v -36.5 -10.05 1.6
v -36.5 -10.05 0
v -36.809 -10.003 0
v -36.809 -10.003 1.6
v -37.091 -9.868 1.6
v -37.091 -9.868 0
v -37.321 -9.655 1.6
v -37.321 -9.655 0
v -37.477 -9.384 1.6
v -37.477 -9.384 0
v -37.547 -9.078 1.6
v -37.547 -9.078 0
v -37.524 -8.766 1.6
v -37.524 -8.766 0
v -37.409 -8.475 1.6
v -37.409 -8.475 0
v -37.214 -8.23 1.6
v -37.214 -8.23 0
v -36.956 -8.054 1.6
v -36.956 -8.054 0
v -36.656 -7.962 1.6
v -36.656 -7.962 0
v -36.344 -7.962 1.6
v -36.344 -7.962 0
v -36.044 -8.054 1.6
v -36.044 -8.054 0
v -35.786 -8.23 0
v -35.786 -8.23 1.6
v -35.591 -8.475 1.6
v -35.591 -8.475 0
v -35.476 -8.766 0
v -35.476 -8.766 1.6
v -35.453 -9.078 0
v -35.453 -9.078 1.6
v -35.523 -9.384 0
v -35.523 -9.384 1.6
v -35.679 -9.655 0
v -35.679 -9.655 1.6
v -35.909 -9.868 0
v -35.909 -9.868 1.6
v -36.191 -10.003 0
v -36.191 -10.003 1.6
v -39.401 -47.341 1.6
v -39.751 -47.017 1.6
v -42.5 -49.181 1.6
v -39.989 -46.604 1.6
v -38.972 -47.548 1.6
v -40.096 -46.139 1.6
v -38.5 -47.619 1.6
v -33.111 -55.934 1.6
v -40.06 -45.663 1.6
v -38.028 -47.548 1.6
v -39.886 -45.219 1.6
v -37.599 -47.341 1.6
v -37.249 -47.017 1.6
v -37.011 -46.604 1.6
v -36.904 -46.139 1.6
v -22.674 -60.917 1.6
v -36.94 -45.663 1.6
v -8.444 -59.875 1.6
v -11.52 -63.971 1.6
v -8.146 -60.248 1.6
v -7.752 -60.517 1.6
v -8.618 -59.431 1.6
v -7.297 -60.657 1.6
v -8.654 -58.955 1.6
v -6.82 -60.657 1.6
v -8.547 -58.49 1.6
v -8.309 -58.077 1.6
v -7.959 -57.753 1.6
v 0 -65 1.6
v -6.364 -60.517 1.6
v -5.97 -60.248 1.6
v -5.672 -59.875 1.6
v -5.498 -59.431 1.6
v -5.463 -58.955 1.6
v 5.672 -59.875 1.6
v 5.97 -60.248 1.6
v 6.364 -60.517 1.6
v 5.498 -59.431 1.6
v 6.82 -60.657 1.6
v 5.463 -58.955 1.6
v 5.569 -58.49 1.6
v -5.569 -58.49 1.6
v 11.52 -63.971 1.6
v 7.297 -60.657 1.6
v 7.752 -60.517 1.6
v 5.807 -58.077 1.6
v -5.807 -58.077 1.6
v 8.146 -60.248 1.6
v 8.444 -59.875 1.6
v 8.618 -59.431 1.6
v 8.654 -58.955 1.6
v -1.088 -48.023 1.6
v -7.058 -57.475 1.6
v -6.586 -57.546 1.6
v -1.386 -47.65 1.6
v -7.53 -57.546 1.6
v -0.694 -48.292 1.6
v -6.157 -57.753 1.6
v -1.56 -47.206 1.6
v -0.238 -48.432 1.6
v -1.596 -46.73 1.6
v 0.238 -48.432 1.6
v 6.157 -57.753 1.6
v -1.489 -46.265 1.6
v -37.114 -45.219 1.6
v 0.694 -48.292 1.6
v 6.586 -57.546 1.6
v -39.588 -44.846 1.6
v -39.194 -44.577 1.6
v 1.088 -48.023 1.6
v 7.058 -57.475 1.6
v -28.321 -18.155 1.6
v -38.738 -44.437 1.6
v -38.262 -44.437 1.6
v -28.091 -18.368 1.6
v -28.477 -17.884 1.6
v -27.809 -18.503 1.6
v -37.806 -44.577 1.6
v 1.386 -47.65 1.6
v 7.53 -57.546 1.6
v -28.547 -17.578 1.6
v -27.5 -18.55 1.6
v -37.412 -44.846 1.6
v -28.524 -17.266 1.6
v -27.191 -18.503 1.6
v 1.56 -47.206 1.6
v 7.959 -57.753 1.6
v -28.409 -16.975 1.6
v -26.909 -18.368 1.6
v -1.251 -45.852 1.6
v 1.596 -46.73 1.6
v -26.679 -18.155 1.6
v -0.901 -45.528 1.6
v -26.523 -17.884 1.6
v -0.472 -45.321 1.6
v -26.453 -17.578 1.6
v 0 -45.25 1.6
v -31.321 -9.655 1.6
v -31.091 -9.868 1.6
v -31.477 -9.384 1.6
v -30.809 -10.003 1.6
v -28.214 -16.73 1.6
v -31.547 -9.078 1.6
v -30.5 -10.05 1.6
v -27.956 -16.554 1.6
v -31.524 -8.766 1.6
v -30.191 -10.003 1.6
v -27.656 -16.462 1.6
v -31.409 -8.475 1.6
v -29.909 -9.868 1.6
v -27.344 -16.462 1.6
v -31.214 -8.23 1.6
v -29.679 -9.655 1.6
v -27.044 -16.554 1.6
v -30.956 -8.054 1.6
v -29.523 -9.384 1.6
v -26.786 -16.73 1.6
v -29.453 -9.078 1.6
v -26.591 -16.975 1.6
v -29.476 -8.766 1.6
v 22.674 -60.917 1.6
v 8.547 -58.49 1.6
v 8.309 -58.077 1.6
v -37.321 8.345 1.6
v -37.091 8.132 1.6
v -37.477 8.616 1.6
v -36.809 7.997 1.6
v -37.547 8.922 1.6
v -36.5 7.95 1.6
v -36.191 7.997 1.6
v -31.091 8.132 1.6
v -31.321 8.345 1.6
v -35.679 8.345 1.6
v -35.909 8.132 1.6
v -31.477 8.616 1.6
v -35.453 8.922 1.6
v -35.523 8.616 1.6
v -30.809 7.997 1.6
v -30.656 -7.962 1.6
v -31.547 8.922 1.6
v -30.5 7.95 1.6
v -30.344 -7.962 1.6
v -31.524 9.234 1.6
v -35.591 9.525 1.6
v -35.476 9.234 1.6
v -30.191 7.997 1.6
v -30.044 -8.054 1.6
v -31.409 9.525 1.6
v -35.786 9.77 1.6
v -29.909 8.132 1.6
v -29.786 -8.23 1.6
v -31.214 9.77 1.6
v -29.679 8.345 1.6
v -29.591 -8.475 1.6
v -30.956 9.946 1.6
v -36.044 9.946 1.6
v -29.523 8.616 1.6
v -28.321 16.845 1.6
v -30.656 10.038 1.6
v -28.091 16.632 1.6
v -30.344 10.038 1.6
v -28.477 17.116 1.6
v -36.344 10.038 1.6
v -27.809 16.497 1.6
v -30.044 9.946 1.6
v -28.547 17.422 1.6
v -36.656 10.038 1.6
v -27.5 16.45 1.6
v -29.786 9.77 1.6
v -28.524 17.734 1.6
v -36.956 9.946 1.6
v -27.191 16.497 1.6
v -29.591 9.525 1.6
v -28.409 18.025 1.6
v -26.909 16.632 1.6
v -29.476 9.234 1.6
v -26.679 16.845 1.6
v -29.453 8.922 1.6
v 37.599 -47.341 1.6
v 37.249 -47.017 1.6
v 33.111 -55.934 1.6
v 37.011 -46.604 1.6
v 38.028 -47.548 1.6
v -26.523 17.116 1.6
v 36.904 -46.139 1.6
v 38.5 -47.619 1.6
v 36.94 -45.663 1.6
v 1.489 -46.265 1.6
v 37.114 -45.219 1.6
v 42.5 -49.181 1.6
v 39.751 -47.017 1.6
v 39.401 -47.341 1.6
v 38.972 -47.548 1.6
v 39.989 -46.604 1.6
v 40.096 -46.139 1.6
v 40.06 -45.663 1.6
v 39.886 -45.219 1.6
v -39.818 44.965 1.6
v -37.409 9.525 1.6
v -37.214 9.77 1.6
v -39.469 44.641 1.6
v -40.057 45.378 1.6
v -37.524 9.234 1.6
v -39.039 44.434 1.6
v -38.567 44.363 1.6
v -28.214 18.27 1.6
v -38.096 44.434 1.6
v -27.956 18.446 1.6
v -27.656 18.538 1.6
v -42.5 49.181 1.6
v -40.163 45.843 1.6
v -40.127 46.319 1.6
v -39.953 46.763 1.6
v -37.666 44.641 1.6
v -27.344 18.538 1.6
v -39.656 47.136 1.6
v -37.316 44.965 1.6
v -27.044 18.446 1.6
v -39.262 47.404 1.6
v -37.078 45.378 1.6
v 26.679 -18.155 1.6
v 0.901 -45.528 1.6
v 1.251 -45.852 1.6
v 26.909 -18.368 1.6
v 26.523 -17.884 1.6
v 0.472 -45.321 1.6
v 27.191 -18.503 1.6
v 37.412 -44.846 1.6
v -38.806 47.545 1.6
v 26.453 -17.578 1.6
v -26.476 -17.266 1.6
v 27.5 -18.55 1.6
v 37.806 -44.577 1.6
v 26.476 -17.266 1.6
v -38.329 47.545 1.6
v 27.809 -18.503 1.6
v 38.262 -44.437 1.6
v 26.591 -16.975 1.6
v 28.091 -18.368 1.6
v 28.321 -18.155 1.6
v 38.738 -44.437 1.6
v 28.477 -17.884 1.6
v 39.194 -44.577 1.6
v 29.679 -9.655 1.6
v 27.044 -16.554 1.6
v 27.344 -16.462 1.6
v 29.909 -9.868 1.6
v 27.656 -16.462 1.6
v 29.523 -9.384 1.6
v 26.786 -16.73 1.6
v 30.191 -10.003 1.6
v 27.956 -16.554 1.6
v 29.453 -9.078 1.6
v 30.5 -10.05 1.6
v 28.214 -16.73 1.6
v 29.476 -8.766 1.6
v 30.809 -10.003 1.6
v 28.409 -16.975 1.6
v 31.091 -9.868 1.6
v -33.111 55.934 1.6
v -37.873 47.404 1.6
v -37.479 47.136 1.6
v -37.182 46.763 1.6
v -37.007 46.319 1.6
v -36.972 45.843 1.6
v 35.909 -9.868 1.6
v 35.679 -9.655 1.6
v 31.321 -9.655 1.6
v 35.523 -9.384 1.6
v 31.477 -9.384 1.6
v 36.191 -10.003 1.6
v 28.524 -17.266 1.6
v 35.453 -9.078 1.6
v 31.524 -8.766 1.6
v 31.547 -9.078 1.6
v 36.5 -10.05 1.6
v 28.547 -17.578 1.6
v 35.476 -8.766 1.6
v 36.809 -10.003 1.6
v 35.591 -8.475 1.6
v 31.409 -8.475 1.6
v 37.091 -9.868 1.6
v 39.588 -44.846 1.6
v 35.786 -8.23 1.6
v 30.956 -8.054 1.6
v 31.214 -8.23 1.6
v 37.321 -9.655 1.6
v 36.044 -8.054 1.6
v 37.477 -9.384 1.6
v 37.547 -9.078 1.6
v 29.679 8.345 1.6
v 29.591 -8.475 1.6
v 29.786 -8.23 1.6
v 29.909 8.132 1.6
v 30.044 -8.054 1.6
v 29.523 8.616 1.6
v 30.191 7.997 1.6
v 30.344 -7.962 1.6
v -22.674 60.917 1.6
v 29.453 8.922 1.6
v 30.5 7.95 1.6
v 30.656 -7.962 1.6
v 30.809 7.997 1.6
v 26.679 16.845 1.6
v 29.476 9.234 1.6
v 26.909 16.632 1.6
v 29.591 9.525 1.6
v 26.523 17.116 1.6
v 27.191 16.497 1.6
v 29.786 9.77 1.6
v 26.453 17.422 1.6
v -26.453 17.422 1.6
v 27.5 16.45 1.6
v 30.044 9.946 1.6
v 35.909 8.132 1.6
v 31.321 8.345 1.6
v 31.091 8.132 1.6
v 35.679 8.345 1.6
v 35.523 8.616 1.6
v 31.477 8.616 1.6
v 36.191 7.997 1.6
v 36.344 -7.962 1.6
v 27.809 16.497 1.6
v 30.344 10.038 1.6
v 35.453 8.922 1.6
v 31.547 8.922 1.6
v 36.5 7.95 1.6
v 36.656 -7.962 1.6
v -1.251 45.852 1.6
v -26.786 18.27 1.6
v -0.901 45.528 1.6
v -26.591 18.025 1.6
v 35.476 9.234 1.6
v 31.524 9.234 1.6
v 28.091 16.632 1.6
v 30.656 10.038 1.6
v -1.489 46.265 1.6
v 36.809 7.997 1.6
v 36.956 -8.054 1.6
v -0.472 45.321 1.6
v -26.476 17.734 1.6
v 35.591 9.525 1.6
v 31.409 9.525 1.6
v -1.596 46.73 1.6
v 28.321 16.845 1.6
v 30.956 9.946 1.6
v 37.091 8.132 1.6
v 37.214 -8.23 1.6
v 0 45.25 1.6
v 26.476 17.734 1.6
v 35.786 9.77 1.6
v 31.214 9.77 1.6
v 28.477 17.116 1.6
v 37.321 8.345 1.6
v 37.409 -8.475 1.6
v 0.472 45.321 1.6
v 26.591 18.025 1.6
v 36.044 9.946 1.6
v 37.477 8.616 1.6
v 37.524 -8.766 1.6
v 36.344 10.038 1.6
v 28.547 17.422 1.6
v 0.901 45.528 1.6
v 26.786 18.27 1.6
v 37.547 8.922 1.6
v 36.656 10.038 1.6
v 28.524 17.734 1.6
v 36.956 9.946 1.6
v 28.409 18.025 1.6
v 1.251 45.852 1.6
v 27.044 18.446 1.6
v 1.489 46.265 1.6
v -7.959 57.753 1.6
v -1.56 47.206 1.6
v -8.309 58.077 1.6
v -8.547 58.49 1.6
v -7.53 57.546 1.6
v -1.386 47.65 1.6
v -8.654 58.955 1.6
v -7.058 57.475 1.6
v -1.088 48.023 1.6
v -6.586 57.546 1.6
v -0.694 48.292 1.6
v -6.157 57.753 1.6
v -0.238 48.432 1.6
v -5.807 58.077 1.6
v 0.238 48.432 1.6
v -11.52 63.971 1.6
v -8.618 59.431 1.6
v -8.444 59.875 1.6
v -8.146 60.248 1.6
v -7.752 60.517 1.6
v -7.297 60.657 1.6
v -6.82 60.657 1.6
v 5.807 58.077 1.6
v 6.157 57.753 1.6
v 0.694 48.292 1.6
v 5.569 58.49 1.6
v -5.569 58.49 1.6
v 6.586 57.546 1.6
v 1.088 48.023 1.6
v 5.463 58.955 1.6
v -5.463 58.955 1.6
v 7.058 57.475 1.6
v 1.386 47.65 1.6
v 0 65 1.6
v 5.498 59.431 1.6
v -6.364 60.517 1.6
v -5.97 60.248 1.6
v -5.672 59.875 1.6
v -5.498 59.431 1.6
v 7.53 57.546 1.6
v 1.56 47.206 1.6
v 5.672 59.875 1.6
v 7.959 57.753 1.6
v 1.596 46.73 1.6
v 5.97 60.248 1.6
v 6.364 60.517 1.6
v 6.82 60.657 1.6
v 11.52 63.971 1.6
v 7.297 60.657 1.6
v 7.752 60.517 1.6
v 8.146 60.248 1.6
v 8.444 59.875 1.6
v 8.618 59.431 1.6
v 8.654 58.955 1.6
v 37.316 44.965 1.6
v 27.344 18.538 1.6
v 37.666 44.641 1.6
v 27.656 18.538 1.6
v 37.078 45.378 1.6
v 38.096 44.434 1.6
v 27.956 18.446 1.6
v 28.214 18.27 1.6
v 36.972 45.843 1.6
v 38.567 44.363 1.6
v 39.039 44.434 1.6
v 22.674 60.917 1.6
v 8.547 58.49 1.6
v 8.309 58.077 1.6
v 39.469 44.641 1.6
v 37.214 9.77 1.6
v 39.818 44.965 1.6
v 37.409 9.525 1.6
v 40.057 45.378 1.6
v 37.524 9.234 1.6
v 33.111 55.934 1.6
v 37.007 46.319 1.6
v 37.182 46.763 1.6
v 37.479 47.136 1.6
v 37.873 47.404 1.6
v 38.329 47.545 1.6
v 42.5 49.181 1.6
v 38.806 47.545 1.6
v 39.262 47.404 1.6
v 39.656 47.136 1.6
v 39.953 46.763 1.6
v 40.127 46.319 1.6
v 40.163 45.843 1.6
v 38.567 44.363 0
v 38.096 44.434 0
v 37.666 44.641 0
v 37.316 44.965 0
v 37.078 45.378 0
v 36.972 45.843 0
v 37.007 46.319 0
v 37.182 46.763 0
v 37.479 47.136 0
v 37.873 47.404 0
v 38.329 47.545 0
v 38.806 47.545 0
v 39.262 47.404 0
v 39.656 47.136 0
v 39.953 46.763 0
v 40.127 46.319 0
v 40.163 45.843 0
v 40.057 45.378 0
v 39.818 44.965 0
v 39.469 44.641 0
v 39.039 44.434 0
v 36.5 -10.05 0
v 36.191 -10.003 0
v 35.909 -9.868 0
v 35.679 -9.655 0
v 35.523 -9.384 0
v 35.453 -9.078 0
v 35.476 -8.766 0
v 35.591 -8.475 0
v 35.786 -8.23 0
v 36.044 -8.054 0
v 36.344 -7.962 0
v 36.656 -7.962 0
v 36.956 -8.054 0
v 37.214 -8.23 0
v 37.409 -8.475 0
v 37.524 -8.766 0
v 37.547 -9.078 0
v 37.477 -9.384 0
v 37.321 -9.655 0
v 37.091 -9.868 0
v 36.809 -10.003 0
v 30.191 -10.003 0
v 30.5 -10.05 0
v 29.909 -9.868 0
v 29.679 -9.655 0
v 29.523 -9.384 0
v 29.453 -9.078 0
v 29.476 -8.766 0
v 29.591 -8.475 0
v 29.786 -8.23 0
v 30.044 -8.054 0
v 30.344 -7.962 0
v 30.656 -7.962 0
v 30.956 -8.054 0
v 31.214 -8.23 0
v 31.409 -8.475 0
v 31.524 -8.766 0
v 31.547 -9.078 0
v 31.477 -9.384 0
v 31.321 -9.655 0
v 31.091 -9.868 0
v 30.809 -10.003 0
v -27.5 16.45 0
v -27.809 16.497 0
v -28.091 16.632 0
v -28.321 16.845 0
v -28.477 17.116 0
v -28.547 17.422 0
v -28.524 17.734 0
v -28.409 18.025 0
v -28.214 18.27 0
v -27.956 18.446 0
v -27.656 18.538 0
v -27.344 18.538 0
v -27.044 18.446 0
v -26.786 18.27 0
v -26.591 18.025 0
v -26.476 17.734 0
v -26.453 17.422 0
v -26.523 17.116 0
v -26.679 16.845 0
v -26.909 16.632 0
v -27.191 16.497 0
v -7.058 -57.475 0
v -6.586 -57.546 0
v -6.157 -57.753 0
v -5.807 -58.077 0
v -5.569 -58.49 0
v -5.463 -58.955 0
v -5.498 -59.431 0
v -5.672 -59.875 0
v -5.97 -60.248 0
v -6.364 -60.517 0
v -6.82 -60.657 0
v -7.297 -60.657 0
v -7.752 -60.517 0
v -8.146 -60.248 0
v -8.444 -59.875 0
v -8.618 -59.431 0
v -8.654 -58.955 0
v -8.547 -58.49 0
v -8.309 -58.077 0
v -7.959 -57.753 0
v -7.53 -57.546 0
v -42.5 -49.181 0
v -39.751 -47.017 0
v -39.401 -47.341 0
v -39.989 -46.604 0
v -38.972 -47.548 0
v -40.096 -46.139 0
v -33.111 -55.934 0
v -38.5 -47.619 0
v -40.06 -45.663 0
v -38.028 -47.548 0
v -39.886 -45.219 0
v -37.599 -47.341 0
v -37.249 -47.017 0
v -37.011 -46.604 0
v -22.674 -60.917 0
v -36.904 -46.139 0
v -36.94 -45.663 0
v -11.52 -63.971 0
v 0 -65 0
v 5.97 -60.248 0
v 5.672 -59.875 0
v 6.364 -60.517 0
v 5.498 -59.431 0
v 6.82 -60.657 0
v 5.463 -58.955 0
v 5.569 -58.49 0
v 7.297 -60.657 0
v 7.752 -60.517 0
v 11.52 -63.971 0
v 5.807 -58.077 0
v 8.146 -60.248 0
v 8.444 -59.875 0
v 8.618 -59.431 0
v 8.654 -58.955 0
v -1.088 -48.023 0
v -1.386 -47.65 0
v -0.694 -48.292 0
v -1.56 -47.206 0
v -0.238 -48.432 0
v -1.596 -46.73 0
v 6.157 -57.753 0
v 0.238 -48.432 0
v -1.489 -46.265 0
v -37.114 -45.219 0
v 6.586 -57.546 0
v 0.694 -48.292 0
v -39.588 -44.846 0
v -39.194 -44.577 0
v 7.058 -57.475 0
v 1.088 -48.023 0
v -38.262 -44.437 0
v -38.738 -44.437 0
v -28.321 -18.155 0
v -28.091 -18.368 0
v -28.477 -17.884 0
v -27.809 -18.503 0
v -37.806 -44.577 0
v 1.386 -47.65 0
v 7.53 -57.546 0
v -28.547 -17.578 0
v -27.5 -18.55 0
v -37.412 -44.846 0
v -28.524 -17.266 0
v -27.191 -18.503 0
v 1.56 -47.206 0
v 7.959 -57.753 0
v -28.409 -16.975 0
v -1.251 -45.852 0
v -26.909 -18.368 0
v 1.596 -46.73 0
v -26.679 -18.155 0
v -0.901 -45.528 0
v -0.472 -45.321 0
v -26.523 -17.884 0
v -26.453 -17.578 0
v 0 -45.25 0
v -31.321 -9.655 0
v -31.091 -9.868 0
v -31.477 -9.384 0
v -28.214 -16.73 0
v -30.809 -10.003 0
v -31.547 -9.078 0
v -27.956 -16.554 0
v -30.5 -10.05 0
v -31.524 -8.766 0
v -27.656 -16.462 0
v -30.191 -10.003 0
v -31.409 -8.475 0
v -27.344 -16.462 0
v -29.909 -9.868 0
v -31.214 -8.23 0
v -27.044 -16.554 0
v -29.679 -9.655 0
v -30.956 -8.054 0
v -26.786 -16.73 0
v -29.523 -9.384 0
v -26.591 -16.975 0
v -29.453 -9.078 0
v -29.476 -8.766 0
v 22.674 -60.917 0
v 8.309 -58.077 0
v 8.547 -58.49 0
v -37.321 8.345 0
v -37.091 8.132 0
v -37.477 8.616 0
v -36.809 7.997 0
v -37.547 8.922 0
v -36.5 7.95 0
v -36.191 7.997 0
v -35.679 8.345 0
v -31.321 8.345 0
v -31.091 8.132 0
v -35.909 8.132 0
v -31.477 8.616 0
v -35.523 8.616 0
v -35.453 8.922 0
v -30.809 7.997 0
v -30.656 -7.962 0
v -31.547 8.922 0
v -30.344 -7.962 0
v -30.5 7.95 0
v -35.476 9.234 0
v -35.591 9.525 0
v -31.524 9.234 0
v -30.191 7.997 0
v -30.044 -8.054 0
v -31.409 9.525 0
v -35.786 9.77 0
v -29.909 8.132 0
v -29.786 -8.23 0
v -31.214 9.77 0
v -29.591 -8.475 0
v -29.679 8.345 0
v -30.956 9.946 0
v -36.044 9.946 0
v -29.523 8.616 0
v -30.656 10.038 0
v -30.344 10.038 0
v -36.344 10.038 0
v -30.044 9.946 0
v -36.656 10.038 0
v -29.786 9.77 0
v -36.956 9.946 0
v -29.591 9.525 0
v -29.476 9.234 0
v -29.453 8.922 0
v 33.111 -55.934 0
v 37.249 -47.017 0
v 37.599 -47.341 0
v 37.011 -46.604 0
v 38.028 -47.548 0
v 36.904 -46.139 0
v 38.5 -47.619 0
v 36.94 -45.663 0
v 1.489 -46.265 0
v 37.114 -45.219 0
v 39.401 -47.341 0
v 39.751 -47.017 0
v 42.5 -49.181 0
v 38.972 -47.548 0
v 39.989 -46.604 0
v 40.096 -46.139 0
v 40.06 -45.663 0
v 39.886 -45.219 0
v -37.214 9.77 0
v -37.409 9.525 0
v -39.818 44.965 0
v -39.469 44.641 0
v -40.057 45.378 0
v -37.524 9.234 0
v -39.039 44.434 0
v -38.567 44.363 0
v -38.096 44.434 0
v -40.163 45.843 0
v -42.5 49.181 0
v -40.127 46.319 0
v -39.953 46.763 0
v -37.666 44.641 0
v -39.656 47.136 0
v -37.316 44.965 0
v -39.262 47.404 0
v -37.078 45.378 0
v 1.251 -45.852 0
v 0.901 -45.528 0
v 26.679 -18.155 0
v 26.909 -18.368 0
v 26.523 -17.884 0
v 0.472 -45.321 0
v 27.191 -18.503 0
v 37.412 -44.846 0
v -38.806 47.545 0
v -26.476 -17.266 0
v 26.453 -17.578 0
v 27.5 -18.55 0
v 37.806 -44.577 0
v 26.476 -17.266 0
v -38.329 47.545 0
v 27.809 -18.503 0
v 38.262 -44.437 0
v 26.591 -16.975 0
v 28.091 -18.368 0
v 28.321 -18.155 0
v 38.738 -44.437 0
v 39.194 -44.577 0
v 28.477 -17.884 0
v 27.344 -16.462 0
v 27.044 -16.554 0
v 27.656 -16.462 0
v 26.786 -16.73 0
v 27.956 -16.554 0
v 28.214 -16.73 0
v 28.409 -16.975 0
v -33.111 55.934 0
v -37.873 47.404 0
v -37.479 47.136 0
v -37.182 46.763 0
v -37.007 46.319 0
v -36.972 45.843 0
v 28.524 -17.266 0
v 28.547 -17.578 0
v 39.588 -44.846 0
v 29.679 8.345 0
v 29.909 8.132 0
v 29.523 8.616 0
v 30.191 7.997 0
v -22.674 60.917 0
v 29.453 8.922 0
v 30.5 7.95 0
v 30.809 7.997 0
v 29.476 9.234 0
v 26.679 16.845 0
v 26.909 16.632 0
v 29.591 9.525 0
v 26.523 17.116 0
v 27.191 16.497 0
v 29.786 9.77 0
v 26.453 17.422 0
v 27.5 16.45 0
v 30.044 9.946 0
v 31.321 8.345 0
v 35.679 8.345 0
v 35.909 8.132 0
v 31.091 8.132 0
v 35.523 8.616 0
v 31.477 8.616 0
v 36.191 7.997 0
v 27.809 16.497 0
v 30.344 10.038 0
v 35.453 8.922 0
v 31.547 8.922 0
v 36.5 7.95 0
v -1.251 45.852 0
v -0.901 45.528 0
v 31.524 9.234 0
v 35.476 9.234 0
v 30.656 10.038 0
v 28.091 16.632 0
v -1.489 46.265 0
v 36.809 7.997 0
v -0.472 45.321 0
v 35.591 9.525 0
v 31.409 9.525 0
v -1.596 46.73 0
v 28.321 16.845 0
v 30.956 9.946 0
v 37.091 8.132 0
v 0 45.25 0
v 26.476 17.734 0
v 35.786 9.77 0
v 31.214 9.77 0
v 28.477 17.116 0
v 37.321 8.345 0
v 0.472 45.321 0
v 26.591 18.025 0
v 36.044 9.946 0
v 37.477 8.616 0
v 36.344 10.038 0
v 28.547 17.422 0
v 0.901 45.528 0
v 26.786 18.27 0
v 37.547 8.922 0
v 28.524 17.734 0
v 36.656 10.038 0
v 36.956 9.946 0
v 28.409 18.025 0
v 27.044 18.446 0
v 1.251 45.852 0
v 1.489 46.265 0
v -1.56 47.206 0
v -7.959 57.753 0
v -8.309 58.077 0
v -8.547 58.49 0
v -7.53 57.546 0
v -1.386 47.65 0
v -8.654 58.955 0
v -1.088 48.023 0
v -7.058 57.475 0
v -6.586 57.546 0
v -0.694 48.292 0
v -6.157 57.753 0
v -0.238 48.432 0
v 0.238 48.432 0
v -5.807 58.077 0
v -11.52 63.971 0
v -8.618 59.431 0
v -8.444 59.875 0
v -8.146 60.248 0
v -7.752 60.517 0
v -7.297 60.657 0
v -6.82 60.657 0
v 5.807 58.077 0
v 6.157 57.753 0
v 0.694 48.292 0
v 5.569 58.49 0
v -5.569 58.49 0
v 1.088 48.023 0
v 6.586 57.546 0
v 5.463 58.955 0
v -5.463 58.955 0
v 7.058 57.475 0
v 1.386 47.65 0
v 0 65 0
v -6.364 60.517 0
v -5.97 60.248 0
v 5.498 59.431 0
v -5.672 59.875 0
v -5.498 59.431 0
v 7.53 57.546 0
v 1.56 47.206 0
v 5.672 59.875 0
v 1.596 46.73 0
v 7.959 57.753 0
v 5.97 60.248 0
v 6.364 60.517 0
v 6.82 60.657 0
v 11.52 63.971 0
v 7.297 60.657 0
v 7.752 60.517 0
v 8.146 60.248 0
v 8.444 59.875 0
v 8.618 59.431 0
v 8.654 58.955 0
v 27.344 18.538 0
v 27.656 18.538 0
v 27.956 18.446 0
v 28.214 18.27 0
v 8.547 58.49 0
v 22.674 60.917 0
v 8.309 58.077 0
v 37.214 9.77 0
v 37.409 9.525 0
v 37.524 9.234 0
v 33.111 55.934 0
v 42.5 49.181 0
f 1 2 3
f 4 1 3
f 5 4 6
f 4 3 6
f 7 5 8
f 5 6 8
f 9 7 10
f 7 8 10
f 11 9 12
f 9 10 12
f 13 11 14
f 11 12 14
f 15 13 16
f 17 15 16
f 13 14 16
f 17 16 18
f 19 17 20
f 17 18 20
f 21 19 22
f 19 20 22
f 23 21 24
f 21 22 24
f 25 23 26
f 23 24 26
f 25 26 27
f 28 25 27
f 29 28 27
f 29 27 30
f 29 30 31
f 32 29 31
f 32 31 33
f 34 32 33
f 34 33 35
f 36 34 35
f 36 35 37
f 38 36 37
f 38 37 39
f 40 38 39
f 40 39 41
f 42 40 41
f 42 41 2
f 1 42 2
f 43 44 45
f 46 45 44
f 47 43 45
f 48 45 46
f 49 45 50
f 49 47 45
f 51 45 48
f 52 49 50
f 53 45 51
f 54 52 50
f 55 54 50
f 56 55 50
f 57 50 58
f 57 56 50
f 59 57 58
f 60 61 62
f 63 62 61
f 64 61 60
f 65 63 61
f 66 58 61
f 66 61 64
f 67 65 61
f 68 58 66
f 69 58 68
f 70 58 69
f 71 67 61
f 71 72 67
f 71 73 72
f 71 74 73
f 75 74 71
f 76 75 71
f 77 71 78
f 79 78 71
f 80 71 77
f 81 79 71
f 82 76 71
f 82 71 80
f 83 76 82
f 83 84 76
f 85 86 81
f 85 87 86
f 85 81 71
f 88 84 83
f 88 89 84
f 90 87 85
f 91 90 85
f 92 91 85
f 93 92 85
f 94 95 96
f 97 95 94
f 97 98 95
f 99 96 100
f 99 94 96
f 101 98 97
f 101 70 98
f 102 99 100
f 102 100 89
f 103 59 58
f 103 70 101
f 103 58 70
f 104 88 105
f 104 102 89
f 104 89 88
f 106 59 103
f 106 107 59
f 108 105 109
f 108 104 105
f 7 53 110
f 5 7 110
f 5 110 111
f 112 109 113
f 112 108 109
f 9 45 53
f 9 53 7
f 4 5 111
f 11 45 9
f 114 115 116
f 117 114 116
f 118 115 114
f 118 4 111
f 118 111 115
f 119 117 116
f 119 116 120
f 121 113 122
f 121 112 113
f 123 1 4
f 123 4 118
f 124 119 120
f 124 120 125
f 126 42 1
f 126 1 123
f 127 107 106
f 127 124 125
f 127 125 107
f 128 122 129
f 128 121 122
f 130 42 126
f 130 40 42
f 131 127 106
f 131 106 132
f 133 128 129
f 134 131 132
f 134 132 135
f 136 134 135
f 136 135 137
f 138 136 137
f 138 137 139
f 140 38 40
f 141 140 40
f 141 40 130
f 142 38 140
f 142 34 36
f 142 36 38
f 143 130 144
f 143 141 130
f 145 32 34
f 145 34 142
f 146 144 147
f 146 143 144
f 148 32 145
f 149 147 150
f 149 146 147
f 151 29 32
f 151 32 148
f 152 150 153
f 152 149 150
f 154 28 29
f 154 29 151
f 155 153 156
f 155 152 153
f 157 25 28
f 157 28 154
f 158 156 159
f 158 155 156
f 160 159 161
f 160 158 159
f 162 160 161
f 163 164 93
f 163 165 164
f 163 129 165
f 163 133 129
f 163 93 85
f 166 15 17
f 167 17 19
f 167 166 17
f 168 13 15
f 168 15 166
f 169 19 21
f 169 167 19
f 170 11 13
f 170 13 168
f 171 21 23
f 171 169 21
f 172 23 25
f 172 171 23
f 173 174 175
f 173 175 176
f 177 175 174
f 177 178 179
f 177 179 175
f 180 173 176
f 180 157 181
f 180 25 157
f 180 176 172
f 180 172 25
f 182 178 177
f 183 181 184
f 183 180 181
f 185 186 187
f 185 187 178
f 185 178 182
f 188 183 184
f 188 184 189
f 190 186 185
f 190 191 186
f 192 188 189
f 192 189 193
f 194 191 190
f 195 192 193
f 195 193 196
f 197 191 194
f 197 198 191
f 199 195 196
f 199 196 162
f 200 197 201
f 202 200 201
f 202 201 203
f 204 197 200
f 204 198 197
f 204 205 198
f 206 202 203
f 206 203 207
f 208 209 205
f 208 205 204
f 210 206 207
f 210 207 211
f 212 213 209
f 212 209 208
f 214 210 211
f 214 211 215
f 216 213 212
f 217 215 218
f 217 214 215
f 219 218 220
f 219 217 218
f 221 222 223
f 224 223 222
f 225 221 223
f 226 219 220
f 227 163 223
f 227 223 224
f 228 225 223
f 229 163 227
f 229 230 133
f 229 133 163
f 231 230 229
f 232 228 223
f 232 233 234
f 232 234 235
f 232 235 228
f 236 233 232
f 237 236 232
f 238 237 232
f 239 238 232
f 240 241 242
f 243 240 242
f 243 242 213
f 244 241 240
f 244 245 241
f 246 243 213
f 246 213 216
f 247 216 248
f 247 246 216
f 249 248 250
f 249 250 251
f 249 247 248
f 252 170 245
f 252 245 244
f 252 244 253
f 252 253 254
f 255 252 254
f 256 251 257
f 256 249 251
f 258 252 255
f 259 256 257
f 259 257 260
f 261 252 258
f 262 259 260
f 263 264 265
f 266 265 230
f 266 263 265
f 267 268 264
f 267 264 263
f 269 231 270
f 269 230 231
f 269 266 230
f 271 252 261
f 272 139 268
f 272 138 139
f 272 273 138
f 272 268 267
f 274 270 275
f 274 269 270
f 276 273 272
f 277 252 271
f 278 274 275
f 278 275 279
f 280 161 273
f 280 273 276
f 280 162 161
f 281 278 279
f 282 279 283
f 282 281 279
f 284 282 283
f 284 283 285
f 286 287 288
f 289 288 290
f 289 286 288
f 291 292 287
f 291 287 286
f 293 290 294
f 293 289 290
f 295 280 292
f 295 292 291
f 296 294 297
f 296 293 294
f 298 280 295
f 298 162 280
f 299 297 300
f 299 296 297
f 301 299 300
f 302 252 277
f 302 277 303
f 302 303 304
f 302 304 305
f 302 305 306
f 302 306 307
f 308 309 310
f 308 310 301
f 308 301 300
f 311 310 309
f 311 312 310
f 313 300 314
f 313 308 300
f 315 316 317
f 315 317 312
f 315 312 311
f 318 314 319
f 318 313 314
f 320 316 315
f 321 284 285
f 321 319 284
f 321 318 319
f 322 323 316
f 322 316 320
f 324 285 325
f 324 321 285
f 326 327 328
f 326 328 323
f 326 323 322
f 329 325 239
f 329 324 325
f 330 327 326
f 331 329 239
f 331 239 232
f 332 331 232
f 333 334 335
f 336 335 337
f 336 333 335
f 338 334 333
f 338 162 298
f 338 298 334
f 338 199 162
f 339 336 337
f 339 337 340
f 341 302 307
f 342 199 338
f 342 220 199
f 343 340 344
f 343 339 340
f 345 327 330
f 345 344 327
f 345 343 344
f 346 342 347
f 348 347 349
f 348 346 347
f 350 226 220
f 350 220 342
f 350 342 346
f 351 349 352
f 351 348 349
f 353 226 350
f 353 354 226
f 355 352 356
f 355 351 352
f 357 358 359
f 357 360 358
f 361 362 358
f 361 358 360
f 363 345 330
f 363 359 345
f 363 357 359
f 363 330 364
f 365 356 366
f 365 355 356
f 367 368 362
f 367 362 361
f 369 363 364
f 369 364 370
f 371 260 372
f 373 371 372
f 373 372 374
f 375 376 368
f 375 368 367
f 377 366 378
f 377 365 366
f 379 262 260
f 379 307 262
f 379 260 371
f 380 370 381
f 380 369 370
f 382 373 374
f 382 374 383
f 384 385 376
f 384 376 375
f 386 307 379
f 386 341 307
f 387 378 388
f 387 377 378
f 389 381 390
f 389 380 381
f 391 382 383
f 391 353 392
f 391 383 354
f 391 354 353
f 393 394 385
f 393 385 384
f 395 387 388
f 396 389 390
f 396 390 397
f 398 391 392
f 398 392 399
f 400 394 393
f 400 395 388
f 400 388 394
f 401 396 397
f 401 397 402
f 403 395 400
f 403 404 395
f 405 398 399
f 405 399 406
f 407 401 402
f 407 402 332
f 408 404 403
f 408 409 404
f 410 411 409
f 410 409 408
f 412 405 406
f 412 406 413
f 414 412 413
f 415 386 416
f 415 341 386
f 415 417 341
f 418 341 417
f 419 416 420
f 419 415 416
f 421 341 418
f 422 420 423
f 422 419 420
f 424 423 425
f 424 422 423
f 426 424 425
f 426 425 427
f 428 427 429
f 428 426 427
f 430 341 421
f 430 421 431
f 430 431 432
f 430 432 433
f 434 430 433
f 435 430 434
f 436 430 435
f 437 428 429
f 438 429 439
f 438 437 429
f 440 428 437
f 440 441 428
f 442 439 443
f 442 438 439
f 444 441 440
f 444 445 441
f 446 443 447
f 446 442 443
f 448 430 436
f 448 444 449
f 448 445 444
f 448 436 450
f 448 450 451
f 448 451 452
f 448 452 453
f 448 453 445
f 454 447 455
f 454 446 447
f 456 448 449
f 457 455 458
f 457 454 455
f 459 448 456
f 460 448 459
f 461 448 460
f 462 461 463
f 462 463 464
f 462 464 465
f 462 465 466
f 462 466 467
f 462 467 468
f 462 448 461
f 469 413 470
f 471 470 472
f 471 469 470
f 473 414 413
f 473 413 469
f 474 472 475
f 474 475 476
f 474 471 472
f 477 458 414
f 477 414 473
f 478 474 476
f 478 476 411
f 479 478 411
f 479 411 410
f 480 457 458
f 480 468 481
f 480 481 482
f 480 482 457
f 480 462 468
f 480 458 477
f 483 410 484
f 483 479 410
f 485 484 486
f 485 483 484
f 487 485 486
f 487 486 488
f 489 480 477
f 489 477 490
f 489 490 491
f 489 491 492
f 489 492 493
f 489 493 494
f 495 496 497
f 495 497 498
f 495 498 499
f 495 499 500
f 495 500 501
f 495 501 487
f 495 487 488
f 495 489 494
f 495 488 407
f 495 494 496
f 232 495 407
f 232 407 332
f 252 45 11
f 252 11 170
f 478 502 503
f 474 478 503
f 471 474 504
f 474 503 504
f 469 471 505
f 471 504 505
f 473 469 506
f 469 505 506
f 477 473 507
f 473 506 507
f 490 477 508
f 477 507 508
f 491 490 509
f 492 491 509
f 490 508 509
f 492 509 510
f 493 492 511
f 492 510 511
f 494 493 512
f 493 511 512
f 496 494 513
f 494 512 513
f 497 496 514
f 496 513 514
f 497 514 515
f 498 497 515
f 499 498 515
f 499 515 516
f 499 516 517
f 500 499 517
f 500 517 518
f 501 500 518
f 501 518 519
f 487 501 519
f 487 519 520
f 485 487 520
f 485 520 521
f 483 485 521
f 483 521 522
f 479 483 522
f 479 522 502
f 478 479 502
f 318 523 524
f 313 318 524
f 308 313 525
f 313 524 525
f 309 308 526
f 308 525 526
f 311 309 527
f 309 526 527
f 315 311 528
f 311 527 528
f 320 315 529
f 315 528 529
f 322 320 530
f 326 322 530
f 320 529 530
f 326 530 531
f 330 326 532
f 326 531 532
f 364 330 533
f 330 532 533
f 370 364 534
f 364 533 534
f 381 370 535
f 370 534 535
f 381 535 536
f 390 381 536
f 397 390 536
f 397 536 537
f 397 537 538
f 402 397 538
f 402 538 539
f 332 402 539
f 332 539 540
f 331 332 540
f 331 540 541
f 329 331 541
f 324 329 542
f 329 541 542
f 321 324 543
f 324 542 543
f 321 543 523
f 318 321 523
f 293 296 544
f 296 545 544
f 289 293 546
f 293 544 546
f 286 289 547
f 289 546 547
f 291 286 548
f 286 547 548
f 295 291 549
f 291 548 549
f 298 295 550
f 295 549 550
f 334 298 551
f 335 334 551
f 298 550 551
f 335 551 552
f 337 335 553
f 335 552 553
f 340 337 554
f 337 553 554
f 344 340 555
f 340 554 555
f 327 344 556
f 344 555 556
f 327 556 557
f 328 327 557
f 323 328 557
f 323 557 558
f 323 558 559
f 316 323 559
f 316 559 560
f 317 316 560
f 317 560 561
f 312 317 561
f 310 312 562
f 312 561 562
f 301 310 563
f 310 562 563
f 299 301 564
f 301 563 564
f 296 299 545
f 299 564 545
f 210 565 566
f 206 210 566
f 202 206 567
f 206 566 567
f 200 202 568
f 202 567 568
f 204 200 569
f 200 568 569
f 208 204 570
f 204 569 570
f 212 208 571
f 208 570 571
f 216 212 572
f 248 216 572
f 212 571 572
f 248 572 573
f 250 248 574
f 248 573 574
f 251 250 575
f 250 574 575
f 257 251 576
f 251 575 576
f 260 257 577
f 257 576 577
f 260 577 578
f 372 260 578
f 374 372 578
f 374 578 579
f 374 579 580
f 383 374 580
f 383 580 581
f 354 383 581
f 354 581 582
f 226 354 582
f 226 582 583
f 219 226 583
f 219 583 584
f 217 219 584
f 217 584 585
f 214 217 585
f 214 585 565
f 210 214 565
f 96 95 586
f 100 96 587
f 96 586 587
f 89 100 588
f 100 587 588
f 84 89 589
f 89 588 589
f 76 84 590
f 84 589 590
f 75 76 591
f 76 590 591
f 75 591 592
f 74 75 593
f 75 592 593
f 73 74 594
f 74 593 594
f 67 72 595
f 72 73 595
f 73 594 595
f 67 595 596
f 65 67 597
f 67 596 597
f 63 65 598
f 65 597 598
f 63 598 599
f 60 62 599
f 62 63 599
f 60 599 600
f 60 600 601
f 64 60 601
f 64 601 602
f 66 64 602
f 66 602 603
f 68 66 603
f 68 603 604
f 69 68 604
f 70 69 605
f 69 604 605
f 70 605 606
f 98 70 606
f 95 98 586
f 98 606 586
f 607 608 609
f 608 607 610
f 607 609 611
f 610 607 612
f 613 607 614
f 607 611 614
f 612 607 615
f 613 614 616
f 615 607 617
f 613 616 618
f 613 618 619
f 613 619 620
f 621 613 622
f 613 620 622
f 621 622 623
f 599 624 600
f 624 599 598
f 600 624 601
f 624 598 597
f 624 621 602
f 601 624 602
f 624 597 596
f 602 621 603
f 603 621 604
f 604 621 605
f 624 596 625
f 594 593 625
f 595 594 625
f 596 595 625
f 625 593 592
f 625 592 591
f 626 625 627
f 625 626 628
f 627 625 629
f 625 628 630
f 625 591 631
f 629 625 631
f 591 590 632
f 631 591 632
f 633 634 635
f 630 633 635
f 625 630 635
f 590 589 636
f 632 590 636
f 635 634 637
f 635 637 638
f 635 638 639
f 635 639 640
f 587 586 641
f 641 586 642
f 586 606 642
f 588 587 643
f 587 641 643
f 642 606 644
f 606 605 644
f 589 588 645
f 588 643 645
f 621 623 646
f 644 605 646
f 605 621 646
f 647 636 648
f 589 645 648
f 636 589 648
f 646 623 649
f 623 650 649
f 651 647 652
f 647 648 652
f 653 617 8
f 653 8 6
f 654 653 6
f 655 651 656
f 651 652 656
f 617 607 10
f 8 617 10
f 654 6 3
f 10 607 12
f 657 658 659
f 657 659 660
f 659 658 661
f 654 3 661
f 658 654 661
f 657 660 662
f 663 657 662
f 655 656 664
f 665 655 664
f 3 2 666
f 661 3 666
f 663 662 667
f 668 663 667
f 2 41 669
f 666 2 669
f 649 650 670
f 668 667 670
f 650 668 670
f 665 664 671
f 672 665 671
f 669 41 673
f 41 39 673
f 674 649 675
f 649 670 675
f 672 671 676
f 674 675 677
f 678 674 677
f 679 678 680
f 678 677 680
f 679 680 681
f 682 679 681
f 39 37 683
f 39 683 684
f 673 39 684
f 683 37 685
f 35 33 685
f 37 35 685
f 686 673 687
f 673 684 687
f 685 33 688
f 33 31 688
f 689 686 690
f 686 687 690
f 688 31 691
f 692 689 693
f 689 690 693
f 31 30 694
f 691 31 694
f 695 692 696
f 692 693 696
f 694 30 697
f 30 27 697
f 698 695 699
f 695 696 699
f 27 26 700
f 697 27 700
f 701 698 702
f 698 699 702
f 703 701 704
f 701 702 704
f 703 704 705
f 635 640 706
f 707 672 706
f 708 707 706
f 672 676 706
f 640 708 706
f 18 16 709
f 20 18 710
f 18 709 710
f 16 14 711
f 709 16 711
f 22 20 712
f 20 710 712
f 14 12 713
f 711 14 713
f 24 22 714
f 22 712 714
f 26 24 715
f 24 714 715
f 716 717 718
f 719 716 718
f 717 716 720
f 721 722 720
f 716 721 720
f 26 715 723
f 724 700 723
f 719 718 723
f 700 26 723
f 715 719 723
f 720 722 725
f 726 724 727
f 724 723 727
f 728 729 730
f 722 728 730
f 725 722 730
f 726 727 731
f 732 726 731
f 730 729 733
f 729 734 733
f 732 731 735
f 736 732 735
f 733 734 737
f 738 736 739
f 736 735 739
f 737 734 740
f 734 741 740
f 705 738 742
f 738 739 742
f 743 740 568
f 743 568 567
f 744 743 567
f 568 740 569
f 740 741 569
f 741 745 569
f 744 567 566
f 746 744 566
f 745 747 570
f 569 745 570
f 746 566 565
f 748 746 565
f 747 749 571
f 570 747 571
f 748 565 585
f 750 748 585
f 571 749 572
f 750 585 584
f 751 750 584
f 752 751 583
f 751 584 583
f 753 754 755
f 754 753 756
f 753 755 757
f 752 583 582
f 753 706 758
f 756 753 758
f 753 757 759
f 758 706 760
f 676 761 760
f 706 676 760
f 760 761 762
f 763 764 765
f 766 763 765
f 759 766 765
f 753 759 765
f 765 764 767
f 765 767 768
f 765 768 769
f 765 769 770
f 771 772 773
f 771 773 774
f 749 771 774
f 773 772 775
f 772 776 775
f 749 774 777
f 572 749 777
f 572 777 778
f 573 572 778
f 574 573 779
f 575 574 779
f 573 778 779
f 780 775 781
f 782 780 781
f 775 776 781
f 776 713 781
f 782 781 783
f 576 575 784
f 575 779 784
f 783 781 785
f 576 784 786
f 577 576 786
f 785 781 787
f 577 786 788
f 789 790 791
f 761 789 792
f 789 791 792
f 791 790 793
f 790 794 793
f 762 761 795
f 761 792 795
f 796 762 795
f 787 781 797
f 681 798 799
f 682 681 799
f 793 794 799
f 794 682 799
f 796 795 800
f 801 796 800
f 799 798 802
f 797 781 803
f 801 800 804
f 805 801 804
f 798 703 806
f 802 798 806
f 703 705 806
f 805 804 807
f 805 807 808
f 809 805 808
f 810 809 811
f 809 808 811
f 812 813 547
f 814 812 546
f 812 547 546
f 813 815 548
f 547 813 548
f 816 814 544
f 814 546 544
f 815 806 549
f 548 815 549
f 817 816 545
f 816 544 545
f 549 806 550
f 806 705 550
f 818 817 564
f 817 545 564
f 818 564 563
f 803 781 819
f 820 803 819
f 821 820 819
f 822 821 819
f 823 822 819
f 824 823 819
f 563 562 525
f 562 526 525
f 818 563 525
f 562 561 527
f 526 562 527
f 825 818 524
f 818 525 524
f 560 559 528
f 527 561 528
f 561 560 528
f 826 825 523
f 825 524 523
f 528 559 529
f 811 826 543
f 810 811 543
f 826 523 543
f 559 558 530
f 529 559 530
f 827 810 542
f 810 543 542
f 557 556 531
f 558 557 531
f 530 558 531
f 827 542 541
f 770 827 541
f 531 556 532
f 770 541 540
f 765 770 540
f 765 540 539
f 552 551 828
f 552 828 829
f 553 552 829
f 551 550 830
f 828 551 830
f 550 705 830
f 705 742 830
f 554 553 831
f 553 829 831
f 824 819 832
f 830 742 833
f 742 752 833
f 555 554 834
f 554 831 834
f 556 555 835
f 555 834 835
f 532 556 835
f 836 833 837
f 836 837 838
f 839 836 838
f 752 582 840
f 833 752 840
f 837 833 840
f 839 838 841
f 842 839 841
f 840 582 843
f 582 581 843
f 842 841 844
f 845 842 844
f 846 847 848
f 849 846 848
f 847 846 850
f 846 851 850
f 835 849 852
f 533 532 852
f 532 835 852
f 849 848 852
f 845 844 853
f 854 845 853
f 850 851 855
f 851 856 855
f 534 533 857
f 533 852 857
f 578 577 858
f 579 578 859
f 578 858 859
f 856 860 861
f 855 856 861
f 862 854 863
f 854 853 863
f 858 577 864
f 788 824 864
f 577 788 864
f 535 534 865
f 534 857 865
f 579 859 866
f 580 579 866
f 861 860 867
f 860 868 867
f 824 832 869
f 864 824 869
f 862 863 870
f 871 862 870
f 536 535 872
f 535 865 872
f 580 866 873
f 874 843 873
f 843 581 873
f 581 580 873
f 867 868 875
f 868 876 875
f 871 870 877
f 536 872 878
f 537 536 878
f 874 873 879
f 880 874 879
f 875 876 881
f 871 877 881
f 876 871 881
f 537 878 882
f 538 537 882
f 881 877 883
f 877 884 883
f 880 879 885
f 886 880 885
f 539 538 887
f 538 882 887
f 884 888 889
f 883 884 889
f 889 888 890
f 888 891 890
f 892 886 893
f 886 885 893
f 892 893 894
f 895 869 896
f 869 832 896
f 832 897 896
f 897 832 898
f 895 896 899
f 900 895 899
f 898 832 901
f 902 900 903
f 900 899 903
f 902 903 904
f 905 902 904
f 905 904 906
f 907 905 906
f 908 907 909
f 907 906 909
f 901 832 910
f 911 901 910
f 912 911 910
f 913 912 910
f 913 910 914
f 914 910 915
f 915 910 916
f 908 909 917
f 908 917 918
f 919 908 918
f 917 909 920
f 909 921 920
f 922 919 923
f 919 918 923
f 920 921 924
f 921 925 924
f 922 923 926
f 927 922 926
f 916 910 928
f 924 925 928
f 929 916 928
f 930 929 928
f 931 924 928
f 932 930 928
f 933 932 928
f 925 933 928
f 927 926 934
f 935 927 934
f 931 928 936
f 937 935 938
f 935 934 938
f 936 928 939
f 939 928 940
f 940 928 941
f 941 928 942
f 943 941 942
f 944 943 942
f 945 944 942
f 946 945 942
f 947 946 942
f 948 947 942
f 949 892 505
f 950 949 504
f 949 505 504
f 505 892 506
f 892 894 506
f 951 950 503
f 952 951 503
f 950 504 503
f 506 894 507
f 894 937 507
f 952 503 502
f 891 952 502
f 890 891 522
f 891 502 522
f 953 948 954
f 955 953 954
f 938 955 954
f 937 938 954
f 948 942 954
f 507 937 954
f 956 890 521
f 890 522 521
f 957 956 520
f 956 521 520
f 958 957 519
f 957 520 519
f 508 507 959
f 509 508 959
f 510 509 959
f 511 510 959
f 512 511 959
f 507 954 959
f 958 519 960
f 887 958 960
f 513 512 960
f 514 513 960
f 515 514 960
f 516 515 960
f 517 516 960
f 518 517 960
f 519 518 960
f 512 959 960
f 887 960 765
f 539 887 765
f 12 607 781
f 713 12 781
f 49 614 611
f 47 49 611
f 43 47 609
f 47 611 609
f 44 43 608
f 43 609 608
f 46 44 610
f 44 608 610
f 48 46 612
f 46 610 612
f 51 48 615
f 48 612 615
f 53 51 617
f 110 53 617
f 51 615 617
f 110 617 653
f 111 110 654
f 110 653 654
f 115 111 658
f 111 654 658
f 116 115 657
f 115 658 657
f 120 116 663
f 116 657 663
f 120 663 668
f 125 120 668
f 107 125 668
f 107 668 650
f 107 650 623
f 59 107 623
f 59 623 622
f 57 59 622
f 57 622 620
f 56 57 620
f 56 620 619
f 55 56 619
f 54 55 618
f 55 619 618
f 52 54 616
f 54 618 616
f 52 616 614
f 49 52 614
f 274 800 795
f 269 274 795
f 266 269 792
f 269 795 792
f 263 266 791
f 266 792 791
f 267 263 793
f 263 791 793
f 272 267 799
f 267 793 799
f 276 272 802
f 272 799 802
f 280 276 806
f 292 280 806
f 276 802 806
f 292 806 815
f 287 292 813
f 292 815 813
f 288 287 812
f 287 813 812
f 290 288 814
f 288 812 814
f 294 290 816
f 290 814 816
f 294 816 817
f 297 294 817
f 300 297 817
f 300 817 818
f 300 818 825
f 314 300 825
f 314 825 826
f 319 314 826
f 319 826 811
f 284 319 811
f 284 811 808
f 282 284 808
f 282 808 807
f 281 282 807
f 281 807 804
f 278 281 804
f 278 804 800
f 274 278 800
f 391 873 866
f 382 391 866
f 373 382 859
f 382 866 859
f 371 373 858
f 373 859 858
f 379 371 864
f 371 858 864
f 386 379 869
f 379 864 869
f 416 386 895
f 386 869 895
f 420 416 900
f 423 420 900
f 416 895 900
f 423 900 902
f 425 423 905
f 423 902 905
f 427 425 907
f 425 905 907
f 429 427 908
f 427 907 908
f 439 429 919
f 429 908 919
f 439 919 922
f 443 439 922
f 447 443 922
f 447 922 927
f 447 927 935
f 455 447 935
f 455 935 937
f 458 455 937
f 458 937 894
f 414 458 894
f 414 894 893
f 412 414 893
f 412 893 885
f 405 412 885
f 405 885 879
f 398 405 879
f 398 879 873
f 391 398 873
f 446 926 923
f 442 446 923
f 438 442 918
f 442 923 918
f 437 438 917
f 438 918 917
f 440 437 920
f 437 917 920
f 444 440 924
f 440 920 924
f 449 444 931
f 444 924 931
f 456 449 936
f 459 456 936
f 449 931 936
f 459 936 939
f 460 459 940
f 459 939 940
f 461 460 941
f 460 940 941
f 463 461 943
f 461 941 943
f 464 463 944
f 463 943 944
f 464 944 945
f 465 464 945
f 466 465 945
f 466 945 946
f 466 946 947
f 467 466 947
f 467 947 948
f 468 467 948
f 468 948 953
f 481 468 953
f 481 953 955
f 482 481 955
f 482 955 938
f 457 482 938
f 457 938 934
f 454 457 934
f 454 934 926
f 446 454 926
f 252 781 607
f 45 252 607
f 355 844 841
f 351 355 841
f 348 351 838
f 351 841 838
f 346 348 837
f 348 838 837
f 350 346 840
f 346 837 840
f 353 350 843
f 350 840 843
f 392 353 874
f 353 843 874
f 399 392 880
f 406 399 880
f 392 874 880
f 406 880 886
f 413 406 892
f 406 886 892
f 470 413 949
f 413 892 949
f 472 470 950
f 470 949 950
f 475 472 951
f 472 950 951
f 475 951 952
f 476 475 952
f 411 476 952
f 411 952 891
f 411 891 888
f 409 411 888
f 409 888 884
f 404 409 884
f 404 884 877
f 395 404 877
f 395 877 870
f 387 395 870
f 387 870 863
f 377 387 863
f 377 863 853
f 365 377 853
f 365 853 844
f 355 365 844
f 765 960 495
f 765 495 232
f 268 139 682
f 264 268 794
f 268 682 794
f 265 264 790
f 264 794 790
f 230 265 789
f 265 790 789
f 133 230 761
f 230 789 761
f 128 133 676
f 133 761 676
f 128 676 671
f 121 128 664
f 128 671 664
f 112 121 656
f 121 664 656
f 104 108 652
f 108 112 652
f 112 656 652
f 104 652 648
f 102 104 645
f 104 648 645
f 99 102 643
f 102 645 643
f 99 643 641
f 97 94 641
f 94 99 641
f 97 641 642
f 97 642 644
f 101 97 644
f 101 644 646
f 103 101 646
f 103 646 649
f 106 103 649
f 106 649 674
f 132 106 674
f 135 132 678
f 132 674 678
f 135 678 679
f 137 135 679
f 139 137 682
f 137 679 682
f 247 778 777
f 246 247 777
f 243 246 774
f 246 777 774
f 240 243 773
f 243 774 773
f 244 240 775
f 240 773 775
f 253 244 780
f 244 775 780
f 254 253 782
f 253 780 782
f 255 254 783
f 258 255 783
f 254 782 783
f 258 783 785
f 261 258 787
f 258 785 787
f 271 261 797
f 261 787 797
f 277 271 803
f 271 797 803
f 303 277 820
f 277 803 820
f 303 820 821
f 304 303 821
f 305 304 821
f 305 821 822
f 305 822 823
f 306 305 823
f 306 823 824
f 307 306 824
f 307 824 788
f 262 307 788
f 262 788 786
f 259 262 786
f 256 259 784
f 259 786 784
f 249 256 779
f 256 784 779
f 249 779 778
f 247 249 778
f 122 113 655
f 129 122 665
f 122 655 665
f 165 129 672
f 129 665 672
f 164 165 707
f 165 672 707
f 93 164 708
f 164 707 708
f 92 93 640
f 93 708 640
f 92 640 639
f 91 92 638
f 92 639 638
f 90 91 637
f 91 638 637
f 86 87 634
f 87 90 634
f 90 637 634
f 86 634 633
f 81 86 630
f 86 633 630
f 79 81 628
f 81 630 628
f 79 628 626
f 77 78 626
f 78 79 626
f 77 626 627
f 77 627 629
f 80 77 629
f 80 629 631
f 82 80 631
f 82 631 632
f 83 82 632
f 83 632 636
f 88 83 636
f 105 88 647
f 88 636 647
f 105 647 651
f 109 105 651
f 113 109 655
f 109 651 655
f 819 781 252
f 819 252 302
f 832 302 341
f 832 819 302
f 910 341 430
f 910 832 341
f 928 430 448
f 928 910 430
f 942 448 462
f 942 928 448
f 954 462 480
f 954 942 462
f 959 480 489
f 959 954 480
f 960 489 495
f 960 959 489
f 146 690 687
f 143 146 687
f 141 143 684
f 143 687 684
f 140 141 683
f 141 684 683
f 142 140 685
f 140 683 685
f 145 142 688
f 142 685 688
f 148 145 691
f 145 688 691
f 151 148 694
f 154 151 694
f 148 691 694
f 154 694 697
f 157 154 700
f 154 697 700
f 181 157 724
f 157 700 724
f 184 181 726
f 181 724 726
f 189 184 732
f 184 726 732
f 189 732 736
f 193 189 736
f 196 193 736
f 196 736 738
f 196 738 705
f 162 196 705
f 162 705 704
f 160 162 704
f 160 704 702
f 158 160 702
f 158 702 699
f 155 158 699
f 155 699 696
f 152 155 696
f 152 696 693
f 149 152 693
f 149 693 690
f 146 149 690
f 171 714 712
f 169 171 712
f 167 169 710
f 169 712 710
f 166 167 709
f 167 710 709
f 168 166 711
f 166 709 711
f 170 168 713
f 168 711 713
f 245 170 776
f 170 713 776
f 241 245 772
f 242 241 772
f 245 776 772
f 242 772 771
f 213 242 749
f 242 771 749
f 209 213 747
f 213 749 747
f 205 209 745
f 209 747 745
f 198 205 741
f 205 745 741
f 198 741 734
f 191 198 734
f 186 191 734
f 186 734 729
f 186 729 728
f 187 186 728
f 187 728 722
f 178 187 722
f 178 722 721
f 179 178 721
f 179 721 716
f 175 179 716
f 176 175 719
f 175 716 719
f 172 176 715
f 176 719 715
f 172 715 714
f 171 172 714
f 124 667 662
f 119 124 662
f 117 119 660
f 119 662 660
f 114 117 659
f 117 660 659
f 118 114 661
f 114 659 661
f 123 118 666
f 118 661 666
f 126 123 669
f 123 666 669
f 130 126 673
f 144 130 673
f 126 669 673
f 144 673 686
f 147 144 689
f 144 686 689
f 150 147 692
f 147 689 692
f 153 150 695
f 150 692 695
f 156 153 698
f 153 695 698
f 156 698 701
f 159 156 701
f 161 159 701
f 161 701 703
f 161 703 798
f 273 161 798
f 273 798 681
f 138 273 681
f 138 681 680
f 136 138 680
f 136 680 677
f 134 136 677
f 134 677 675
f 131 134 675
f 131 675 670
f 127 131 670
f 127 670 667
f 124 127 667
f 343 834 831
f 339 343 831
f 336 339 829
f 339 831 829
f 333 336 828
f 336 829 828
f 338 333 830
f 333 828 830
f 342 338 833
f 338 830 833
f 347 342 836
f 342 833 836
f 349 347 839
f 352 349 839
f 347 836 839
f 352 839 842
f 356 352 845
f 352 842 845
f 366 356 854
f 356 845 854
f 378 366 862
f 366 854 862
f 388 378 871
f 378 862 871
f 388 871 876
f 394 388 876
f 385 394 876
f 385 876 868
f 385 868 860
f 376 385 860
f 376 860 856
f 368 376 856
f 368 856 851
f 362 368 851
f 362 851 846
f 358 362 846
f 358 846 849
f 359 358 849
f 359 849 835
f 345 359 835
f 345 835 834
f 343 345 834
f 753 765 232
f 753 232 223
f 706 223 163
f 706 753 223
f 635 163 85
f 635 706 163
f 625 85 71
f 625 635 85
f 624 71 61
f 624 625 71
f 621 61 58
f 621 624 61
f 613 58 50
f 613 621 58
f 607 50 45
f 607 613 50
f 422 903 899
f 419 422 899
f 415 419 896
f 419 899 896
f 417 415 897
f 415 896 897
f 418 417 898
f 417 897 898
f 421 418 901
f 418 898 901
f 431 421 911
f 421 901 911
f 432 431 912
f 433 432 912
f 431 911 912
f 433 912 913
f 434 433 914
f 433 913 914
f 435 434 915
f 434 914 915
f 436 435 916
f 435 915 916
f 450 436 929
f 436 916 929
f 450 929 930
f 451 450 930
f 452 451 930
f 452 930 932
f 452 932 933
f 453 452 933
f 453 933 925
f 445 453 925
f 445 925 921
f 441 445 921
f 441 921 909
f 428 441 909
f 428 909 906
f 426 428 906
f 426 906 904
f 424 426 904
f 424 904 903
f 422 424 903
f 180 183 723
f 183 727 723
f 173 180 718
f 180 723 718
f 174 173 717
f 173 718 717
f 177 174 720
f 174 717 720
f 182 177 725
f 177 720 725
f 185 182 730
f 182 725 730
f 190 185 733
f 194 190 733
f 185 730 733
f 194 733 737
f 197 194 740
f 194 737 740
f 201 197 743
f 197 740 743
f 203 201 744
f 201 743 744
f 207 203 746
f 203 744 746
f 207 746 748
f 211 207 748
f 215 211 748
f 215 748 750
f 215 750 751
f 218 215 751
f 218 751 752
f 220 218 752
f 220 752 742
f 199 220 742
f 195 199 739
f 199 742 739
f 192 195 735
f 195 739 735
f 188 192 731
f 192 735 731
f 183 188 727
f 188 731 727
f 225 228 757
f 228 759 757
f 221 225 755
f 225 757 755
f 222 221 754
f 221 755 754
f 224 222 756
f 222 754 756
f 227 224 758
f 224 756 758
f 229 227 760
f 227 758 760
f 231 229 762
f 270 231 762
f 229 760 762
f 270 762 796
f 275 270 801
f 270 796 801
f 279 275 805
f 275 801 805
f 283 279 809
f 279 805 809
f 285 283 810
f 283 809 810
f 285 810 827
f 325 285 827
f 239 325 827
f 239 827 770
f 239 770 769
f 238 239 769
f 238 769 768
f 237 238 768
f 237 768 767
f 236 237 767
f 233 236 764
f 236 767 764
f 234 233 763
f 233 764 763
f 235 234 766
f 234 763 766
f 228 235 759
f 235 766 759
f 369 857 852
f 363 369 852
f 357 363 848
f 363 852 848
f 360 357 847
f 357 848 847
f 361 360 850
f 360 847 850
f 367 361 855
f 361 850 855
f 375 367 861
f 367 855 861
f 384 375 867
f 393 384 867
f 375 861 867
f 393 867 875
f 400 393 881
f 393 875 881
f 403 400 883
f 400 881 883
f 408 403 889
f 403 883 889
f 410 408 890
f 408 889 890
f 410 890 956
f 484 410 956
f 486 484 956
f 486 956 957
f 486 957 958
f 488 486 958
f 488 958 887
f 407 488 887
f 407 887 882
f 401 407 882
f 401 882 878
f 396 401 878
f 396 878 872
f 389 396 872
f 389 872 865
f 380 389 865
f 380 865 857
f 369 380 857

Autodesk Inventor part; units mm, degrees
ref_plane "YZ Plane" through (0, 0, 0) normal (1, 0, 0) x (0, 1, 0)
ref_plane "XZ Plane" through (0, 0, 0) normal (0, 1, 0) x (-1, 0, 0)
ref_plane "XY Plane" through (0, 0, 0) normal (0, 0, 1) x (1, 0, 0)
sketch "スケッチ1" plane through (0, 0, 0) normal (0, 0, 1) x (1, 0, 0)
  circle A0 centre (0, 0) radius 65 construction
  line L0 (-42.5, 65) -> (42.5, 65) construction
  line L1 (42.5, 65) -> (42.5, -65) construction
  line L2 (42.5, -65) -> (-42.5, -65) construction
  line L3 (-42.5, -65) -> (-42.5, 65) construction
  arc A1 (42.5, 49.1808) -> (-42.5, 49.1808) centre (0, 0) ccw
  line L4 (-42.5, 49.1808) -> (-42.5, -49.1808)
  line L5 (42.5, 49.1808) -> (42.5, -49.1808)
  arc A2 (-42.5, -49.1808) -> (42.5, -49.1808) centre (0, 0) ccw
  point P0 (0, 65)
  dimension "d0" = 130
  dimension "d1" = 85
extrude "基板" add sketch "スケッチ1" along normal blind 1.6
sketch "スケッチ2" plane through (0, 0, 1.6) normal (0, 0, 1) x (1, 0, 0)
  line L0 (-100.8621, 0) -> (100.8621, 0) construction
  line L1 (0, 110.7931) -> (0, -110.7931) construction
  line L2 (-42.5, 49.1808) -> (-42.5, -49.1808) construction
  circle A0 centre (0, 0) radius 60 construction
  point P0 (-36.5, 9)
  point P1 (-30.5, 9)
  point P2 (30.5, 9)
  point P3 (36.5, 9)
  point P4 (-36.5, -9)
  point P5 (-30.5, -9)
  point P6 (30.5, -9)
  point P7 (36.5, -9)
  point P8 (-40, -30)
  point P9 (-40, -45)
  point P10 (-42.5, -49.1808)
  point P11 (-27.5, -17.5)
  point P12 (-27.5, 17.5)
  point P13 (27.5, -17.5)
  point P14 (27.5, 17.5)
  dimension "d4" = 18
  dimension "d5" = 6
  dimension "d6" = 6
  dimension "d26" = 120
  dimension "d38" = 35
  dimension "d39" = 15
hole "モータ取付穴" at (-36.5, 9, 1.6) at (-30.5, 9, 1.6) at (30.5, 9, 1.6) at (36.5, 9, 1.6) at (-36.5, -9, 1.6) at (-30.5, -9, 1.6) at (30.5, -9, 1.6) at (36.5, -9, 1.6) at (-27.5, -17.5, 1.6) at (-27.5, 17.5, 1.6) at (27.5, -17.5, 1.6) at (27.5, 17.5, 1.6) direction (0, 0, -1) diameter 2.1 end through all
sketch "スケッチ3" plane through (0, 0, 1.6) normal (0, 0, 1) x (1, 0, 0)
  line L0 (0, 0) -> (0, 55.332) construction
  line L1 (-15.38, 55) -> (15.38, 55) construction
  line L2 (0, 46.85) -> (-7.0581, 50.925) construction
  line L3 (-7.0581, 50.925) -> (-7.0581, 59.075) construction
  line L4 (-7.0581, 59.075) -> (0, 63.15) construction
  line L5 (0, 63.15) -> (7.0581, 59.075) construction
  line L6 (7.0581, 59.075) -> (7.0581, 50.925) construction
  line L7 (7.0581, 50.925) -> (0, 46.85) construction
  arc A0 (42.5, 49.1808) -> (-42.5, 49.1808) centre (0, 0) ccw construction
  point P0 (0, 55)
  point P1 (0, 55)
  point P2 (0, 65)
  dimension "d17" = 16.3
  dimension "d18" = 10
hole "ボールキャスター取付穴" at (-7.0581, 59.075, 1.6) at (7.0581, 59.075, 1.6) at (0, 46.85, 1.6) direction (0, 0, -1) diameter 3.2 end through all
sketch "スケッチ4" plane through (0, 0, 1.6) normal (0, 0, 1) x (1, 0, 0)
  line L0 (0, -55.1622) -> (0, 55.1622) construction
  line L1 (42.5, -49.1808) -> (42.5, 49.1808) construction
  circle A0 centre (0, 0) radius 60 construction
  line L2 (0, 0) -> (36.3616, 43.334) construction
  line L3 (0, 0) -> (56.5685, 0) construction
  point P0 (38.5, -46.019)
  point P1 (-38.5, -46.019)
  point P2 (38.5673, 45.9627)
  point P3 (-38.5673, 45.9627)
  dimension "d27" = 4
  dimension "d29" = 120
  dimension "d30" = 50
hole "スペーサ取付穴" at (38.5, -46.019, 1.6) at (-38.5, -46.019, 1.6) at (38.5673, 45.9627, 1.6) at (-38.5673, 45.9627, 1.6) direction (0, 0, -1) diameter 3.2 end through all
mirror "ミラー1" about plane through (0, 0, 0) normal (0, 1, 0) of "ボールキャスター取付穴"
properties part number "BaseBoard2"
